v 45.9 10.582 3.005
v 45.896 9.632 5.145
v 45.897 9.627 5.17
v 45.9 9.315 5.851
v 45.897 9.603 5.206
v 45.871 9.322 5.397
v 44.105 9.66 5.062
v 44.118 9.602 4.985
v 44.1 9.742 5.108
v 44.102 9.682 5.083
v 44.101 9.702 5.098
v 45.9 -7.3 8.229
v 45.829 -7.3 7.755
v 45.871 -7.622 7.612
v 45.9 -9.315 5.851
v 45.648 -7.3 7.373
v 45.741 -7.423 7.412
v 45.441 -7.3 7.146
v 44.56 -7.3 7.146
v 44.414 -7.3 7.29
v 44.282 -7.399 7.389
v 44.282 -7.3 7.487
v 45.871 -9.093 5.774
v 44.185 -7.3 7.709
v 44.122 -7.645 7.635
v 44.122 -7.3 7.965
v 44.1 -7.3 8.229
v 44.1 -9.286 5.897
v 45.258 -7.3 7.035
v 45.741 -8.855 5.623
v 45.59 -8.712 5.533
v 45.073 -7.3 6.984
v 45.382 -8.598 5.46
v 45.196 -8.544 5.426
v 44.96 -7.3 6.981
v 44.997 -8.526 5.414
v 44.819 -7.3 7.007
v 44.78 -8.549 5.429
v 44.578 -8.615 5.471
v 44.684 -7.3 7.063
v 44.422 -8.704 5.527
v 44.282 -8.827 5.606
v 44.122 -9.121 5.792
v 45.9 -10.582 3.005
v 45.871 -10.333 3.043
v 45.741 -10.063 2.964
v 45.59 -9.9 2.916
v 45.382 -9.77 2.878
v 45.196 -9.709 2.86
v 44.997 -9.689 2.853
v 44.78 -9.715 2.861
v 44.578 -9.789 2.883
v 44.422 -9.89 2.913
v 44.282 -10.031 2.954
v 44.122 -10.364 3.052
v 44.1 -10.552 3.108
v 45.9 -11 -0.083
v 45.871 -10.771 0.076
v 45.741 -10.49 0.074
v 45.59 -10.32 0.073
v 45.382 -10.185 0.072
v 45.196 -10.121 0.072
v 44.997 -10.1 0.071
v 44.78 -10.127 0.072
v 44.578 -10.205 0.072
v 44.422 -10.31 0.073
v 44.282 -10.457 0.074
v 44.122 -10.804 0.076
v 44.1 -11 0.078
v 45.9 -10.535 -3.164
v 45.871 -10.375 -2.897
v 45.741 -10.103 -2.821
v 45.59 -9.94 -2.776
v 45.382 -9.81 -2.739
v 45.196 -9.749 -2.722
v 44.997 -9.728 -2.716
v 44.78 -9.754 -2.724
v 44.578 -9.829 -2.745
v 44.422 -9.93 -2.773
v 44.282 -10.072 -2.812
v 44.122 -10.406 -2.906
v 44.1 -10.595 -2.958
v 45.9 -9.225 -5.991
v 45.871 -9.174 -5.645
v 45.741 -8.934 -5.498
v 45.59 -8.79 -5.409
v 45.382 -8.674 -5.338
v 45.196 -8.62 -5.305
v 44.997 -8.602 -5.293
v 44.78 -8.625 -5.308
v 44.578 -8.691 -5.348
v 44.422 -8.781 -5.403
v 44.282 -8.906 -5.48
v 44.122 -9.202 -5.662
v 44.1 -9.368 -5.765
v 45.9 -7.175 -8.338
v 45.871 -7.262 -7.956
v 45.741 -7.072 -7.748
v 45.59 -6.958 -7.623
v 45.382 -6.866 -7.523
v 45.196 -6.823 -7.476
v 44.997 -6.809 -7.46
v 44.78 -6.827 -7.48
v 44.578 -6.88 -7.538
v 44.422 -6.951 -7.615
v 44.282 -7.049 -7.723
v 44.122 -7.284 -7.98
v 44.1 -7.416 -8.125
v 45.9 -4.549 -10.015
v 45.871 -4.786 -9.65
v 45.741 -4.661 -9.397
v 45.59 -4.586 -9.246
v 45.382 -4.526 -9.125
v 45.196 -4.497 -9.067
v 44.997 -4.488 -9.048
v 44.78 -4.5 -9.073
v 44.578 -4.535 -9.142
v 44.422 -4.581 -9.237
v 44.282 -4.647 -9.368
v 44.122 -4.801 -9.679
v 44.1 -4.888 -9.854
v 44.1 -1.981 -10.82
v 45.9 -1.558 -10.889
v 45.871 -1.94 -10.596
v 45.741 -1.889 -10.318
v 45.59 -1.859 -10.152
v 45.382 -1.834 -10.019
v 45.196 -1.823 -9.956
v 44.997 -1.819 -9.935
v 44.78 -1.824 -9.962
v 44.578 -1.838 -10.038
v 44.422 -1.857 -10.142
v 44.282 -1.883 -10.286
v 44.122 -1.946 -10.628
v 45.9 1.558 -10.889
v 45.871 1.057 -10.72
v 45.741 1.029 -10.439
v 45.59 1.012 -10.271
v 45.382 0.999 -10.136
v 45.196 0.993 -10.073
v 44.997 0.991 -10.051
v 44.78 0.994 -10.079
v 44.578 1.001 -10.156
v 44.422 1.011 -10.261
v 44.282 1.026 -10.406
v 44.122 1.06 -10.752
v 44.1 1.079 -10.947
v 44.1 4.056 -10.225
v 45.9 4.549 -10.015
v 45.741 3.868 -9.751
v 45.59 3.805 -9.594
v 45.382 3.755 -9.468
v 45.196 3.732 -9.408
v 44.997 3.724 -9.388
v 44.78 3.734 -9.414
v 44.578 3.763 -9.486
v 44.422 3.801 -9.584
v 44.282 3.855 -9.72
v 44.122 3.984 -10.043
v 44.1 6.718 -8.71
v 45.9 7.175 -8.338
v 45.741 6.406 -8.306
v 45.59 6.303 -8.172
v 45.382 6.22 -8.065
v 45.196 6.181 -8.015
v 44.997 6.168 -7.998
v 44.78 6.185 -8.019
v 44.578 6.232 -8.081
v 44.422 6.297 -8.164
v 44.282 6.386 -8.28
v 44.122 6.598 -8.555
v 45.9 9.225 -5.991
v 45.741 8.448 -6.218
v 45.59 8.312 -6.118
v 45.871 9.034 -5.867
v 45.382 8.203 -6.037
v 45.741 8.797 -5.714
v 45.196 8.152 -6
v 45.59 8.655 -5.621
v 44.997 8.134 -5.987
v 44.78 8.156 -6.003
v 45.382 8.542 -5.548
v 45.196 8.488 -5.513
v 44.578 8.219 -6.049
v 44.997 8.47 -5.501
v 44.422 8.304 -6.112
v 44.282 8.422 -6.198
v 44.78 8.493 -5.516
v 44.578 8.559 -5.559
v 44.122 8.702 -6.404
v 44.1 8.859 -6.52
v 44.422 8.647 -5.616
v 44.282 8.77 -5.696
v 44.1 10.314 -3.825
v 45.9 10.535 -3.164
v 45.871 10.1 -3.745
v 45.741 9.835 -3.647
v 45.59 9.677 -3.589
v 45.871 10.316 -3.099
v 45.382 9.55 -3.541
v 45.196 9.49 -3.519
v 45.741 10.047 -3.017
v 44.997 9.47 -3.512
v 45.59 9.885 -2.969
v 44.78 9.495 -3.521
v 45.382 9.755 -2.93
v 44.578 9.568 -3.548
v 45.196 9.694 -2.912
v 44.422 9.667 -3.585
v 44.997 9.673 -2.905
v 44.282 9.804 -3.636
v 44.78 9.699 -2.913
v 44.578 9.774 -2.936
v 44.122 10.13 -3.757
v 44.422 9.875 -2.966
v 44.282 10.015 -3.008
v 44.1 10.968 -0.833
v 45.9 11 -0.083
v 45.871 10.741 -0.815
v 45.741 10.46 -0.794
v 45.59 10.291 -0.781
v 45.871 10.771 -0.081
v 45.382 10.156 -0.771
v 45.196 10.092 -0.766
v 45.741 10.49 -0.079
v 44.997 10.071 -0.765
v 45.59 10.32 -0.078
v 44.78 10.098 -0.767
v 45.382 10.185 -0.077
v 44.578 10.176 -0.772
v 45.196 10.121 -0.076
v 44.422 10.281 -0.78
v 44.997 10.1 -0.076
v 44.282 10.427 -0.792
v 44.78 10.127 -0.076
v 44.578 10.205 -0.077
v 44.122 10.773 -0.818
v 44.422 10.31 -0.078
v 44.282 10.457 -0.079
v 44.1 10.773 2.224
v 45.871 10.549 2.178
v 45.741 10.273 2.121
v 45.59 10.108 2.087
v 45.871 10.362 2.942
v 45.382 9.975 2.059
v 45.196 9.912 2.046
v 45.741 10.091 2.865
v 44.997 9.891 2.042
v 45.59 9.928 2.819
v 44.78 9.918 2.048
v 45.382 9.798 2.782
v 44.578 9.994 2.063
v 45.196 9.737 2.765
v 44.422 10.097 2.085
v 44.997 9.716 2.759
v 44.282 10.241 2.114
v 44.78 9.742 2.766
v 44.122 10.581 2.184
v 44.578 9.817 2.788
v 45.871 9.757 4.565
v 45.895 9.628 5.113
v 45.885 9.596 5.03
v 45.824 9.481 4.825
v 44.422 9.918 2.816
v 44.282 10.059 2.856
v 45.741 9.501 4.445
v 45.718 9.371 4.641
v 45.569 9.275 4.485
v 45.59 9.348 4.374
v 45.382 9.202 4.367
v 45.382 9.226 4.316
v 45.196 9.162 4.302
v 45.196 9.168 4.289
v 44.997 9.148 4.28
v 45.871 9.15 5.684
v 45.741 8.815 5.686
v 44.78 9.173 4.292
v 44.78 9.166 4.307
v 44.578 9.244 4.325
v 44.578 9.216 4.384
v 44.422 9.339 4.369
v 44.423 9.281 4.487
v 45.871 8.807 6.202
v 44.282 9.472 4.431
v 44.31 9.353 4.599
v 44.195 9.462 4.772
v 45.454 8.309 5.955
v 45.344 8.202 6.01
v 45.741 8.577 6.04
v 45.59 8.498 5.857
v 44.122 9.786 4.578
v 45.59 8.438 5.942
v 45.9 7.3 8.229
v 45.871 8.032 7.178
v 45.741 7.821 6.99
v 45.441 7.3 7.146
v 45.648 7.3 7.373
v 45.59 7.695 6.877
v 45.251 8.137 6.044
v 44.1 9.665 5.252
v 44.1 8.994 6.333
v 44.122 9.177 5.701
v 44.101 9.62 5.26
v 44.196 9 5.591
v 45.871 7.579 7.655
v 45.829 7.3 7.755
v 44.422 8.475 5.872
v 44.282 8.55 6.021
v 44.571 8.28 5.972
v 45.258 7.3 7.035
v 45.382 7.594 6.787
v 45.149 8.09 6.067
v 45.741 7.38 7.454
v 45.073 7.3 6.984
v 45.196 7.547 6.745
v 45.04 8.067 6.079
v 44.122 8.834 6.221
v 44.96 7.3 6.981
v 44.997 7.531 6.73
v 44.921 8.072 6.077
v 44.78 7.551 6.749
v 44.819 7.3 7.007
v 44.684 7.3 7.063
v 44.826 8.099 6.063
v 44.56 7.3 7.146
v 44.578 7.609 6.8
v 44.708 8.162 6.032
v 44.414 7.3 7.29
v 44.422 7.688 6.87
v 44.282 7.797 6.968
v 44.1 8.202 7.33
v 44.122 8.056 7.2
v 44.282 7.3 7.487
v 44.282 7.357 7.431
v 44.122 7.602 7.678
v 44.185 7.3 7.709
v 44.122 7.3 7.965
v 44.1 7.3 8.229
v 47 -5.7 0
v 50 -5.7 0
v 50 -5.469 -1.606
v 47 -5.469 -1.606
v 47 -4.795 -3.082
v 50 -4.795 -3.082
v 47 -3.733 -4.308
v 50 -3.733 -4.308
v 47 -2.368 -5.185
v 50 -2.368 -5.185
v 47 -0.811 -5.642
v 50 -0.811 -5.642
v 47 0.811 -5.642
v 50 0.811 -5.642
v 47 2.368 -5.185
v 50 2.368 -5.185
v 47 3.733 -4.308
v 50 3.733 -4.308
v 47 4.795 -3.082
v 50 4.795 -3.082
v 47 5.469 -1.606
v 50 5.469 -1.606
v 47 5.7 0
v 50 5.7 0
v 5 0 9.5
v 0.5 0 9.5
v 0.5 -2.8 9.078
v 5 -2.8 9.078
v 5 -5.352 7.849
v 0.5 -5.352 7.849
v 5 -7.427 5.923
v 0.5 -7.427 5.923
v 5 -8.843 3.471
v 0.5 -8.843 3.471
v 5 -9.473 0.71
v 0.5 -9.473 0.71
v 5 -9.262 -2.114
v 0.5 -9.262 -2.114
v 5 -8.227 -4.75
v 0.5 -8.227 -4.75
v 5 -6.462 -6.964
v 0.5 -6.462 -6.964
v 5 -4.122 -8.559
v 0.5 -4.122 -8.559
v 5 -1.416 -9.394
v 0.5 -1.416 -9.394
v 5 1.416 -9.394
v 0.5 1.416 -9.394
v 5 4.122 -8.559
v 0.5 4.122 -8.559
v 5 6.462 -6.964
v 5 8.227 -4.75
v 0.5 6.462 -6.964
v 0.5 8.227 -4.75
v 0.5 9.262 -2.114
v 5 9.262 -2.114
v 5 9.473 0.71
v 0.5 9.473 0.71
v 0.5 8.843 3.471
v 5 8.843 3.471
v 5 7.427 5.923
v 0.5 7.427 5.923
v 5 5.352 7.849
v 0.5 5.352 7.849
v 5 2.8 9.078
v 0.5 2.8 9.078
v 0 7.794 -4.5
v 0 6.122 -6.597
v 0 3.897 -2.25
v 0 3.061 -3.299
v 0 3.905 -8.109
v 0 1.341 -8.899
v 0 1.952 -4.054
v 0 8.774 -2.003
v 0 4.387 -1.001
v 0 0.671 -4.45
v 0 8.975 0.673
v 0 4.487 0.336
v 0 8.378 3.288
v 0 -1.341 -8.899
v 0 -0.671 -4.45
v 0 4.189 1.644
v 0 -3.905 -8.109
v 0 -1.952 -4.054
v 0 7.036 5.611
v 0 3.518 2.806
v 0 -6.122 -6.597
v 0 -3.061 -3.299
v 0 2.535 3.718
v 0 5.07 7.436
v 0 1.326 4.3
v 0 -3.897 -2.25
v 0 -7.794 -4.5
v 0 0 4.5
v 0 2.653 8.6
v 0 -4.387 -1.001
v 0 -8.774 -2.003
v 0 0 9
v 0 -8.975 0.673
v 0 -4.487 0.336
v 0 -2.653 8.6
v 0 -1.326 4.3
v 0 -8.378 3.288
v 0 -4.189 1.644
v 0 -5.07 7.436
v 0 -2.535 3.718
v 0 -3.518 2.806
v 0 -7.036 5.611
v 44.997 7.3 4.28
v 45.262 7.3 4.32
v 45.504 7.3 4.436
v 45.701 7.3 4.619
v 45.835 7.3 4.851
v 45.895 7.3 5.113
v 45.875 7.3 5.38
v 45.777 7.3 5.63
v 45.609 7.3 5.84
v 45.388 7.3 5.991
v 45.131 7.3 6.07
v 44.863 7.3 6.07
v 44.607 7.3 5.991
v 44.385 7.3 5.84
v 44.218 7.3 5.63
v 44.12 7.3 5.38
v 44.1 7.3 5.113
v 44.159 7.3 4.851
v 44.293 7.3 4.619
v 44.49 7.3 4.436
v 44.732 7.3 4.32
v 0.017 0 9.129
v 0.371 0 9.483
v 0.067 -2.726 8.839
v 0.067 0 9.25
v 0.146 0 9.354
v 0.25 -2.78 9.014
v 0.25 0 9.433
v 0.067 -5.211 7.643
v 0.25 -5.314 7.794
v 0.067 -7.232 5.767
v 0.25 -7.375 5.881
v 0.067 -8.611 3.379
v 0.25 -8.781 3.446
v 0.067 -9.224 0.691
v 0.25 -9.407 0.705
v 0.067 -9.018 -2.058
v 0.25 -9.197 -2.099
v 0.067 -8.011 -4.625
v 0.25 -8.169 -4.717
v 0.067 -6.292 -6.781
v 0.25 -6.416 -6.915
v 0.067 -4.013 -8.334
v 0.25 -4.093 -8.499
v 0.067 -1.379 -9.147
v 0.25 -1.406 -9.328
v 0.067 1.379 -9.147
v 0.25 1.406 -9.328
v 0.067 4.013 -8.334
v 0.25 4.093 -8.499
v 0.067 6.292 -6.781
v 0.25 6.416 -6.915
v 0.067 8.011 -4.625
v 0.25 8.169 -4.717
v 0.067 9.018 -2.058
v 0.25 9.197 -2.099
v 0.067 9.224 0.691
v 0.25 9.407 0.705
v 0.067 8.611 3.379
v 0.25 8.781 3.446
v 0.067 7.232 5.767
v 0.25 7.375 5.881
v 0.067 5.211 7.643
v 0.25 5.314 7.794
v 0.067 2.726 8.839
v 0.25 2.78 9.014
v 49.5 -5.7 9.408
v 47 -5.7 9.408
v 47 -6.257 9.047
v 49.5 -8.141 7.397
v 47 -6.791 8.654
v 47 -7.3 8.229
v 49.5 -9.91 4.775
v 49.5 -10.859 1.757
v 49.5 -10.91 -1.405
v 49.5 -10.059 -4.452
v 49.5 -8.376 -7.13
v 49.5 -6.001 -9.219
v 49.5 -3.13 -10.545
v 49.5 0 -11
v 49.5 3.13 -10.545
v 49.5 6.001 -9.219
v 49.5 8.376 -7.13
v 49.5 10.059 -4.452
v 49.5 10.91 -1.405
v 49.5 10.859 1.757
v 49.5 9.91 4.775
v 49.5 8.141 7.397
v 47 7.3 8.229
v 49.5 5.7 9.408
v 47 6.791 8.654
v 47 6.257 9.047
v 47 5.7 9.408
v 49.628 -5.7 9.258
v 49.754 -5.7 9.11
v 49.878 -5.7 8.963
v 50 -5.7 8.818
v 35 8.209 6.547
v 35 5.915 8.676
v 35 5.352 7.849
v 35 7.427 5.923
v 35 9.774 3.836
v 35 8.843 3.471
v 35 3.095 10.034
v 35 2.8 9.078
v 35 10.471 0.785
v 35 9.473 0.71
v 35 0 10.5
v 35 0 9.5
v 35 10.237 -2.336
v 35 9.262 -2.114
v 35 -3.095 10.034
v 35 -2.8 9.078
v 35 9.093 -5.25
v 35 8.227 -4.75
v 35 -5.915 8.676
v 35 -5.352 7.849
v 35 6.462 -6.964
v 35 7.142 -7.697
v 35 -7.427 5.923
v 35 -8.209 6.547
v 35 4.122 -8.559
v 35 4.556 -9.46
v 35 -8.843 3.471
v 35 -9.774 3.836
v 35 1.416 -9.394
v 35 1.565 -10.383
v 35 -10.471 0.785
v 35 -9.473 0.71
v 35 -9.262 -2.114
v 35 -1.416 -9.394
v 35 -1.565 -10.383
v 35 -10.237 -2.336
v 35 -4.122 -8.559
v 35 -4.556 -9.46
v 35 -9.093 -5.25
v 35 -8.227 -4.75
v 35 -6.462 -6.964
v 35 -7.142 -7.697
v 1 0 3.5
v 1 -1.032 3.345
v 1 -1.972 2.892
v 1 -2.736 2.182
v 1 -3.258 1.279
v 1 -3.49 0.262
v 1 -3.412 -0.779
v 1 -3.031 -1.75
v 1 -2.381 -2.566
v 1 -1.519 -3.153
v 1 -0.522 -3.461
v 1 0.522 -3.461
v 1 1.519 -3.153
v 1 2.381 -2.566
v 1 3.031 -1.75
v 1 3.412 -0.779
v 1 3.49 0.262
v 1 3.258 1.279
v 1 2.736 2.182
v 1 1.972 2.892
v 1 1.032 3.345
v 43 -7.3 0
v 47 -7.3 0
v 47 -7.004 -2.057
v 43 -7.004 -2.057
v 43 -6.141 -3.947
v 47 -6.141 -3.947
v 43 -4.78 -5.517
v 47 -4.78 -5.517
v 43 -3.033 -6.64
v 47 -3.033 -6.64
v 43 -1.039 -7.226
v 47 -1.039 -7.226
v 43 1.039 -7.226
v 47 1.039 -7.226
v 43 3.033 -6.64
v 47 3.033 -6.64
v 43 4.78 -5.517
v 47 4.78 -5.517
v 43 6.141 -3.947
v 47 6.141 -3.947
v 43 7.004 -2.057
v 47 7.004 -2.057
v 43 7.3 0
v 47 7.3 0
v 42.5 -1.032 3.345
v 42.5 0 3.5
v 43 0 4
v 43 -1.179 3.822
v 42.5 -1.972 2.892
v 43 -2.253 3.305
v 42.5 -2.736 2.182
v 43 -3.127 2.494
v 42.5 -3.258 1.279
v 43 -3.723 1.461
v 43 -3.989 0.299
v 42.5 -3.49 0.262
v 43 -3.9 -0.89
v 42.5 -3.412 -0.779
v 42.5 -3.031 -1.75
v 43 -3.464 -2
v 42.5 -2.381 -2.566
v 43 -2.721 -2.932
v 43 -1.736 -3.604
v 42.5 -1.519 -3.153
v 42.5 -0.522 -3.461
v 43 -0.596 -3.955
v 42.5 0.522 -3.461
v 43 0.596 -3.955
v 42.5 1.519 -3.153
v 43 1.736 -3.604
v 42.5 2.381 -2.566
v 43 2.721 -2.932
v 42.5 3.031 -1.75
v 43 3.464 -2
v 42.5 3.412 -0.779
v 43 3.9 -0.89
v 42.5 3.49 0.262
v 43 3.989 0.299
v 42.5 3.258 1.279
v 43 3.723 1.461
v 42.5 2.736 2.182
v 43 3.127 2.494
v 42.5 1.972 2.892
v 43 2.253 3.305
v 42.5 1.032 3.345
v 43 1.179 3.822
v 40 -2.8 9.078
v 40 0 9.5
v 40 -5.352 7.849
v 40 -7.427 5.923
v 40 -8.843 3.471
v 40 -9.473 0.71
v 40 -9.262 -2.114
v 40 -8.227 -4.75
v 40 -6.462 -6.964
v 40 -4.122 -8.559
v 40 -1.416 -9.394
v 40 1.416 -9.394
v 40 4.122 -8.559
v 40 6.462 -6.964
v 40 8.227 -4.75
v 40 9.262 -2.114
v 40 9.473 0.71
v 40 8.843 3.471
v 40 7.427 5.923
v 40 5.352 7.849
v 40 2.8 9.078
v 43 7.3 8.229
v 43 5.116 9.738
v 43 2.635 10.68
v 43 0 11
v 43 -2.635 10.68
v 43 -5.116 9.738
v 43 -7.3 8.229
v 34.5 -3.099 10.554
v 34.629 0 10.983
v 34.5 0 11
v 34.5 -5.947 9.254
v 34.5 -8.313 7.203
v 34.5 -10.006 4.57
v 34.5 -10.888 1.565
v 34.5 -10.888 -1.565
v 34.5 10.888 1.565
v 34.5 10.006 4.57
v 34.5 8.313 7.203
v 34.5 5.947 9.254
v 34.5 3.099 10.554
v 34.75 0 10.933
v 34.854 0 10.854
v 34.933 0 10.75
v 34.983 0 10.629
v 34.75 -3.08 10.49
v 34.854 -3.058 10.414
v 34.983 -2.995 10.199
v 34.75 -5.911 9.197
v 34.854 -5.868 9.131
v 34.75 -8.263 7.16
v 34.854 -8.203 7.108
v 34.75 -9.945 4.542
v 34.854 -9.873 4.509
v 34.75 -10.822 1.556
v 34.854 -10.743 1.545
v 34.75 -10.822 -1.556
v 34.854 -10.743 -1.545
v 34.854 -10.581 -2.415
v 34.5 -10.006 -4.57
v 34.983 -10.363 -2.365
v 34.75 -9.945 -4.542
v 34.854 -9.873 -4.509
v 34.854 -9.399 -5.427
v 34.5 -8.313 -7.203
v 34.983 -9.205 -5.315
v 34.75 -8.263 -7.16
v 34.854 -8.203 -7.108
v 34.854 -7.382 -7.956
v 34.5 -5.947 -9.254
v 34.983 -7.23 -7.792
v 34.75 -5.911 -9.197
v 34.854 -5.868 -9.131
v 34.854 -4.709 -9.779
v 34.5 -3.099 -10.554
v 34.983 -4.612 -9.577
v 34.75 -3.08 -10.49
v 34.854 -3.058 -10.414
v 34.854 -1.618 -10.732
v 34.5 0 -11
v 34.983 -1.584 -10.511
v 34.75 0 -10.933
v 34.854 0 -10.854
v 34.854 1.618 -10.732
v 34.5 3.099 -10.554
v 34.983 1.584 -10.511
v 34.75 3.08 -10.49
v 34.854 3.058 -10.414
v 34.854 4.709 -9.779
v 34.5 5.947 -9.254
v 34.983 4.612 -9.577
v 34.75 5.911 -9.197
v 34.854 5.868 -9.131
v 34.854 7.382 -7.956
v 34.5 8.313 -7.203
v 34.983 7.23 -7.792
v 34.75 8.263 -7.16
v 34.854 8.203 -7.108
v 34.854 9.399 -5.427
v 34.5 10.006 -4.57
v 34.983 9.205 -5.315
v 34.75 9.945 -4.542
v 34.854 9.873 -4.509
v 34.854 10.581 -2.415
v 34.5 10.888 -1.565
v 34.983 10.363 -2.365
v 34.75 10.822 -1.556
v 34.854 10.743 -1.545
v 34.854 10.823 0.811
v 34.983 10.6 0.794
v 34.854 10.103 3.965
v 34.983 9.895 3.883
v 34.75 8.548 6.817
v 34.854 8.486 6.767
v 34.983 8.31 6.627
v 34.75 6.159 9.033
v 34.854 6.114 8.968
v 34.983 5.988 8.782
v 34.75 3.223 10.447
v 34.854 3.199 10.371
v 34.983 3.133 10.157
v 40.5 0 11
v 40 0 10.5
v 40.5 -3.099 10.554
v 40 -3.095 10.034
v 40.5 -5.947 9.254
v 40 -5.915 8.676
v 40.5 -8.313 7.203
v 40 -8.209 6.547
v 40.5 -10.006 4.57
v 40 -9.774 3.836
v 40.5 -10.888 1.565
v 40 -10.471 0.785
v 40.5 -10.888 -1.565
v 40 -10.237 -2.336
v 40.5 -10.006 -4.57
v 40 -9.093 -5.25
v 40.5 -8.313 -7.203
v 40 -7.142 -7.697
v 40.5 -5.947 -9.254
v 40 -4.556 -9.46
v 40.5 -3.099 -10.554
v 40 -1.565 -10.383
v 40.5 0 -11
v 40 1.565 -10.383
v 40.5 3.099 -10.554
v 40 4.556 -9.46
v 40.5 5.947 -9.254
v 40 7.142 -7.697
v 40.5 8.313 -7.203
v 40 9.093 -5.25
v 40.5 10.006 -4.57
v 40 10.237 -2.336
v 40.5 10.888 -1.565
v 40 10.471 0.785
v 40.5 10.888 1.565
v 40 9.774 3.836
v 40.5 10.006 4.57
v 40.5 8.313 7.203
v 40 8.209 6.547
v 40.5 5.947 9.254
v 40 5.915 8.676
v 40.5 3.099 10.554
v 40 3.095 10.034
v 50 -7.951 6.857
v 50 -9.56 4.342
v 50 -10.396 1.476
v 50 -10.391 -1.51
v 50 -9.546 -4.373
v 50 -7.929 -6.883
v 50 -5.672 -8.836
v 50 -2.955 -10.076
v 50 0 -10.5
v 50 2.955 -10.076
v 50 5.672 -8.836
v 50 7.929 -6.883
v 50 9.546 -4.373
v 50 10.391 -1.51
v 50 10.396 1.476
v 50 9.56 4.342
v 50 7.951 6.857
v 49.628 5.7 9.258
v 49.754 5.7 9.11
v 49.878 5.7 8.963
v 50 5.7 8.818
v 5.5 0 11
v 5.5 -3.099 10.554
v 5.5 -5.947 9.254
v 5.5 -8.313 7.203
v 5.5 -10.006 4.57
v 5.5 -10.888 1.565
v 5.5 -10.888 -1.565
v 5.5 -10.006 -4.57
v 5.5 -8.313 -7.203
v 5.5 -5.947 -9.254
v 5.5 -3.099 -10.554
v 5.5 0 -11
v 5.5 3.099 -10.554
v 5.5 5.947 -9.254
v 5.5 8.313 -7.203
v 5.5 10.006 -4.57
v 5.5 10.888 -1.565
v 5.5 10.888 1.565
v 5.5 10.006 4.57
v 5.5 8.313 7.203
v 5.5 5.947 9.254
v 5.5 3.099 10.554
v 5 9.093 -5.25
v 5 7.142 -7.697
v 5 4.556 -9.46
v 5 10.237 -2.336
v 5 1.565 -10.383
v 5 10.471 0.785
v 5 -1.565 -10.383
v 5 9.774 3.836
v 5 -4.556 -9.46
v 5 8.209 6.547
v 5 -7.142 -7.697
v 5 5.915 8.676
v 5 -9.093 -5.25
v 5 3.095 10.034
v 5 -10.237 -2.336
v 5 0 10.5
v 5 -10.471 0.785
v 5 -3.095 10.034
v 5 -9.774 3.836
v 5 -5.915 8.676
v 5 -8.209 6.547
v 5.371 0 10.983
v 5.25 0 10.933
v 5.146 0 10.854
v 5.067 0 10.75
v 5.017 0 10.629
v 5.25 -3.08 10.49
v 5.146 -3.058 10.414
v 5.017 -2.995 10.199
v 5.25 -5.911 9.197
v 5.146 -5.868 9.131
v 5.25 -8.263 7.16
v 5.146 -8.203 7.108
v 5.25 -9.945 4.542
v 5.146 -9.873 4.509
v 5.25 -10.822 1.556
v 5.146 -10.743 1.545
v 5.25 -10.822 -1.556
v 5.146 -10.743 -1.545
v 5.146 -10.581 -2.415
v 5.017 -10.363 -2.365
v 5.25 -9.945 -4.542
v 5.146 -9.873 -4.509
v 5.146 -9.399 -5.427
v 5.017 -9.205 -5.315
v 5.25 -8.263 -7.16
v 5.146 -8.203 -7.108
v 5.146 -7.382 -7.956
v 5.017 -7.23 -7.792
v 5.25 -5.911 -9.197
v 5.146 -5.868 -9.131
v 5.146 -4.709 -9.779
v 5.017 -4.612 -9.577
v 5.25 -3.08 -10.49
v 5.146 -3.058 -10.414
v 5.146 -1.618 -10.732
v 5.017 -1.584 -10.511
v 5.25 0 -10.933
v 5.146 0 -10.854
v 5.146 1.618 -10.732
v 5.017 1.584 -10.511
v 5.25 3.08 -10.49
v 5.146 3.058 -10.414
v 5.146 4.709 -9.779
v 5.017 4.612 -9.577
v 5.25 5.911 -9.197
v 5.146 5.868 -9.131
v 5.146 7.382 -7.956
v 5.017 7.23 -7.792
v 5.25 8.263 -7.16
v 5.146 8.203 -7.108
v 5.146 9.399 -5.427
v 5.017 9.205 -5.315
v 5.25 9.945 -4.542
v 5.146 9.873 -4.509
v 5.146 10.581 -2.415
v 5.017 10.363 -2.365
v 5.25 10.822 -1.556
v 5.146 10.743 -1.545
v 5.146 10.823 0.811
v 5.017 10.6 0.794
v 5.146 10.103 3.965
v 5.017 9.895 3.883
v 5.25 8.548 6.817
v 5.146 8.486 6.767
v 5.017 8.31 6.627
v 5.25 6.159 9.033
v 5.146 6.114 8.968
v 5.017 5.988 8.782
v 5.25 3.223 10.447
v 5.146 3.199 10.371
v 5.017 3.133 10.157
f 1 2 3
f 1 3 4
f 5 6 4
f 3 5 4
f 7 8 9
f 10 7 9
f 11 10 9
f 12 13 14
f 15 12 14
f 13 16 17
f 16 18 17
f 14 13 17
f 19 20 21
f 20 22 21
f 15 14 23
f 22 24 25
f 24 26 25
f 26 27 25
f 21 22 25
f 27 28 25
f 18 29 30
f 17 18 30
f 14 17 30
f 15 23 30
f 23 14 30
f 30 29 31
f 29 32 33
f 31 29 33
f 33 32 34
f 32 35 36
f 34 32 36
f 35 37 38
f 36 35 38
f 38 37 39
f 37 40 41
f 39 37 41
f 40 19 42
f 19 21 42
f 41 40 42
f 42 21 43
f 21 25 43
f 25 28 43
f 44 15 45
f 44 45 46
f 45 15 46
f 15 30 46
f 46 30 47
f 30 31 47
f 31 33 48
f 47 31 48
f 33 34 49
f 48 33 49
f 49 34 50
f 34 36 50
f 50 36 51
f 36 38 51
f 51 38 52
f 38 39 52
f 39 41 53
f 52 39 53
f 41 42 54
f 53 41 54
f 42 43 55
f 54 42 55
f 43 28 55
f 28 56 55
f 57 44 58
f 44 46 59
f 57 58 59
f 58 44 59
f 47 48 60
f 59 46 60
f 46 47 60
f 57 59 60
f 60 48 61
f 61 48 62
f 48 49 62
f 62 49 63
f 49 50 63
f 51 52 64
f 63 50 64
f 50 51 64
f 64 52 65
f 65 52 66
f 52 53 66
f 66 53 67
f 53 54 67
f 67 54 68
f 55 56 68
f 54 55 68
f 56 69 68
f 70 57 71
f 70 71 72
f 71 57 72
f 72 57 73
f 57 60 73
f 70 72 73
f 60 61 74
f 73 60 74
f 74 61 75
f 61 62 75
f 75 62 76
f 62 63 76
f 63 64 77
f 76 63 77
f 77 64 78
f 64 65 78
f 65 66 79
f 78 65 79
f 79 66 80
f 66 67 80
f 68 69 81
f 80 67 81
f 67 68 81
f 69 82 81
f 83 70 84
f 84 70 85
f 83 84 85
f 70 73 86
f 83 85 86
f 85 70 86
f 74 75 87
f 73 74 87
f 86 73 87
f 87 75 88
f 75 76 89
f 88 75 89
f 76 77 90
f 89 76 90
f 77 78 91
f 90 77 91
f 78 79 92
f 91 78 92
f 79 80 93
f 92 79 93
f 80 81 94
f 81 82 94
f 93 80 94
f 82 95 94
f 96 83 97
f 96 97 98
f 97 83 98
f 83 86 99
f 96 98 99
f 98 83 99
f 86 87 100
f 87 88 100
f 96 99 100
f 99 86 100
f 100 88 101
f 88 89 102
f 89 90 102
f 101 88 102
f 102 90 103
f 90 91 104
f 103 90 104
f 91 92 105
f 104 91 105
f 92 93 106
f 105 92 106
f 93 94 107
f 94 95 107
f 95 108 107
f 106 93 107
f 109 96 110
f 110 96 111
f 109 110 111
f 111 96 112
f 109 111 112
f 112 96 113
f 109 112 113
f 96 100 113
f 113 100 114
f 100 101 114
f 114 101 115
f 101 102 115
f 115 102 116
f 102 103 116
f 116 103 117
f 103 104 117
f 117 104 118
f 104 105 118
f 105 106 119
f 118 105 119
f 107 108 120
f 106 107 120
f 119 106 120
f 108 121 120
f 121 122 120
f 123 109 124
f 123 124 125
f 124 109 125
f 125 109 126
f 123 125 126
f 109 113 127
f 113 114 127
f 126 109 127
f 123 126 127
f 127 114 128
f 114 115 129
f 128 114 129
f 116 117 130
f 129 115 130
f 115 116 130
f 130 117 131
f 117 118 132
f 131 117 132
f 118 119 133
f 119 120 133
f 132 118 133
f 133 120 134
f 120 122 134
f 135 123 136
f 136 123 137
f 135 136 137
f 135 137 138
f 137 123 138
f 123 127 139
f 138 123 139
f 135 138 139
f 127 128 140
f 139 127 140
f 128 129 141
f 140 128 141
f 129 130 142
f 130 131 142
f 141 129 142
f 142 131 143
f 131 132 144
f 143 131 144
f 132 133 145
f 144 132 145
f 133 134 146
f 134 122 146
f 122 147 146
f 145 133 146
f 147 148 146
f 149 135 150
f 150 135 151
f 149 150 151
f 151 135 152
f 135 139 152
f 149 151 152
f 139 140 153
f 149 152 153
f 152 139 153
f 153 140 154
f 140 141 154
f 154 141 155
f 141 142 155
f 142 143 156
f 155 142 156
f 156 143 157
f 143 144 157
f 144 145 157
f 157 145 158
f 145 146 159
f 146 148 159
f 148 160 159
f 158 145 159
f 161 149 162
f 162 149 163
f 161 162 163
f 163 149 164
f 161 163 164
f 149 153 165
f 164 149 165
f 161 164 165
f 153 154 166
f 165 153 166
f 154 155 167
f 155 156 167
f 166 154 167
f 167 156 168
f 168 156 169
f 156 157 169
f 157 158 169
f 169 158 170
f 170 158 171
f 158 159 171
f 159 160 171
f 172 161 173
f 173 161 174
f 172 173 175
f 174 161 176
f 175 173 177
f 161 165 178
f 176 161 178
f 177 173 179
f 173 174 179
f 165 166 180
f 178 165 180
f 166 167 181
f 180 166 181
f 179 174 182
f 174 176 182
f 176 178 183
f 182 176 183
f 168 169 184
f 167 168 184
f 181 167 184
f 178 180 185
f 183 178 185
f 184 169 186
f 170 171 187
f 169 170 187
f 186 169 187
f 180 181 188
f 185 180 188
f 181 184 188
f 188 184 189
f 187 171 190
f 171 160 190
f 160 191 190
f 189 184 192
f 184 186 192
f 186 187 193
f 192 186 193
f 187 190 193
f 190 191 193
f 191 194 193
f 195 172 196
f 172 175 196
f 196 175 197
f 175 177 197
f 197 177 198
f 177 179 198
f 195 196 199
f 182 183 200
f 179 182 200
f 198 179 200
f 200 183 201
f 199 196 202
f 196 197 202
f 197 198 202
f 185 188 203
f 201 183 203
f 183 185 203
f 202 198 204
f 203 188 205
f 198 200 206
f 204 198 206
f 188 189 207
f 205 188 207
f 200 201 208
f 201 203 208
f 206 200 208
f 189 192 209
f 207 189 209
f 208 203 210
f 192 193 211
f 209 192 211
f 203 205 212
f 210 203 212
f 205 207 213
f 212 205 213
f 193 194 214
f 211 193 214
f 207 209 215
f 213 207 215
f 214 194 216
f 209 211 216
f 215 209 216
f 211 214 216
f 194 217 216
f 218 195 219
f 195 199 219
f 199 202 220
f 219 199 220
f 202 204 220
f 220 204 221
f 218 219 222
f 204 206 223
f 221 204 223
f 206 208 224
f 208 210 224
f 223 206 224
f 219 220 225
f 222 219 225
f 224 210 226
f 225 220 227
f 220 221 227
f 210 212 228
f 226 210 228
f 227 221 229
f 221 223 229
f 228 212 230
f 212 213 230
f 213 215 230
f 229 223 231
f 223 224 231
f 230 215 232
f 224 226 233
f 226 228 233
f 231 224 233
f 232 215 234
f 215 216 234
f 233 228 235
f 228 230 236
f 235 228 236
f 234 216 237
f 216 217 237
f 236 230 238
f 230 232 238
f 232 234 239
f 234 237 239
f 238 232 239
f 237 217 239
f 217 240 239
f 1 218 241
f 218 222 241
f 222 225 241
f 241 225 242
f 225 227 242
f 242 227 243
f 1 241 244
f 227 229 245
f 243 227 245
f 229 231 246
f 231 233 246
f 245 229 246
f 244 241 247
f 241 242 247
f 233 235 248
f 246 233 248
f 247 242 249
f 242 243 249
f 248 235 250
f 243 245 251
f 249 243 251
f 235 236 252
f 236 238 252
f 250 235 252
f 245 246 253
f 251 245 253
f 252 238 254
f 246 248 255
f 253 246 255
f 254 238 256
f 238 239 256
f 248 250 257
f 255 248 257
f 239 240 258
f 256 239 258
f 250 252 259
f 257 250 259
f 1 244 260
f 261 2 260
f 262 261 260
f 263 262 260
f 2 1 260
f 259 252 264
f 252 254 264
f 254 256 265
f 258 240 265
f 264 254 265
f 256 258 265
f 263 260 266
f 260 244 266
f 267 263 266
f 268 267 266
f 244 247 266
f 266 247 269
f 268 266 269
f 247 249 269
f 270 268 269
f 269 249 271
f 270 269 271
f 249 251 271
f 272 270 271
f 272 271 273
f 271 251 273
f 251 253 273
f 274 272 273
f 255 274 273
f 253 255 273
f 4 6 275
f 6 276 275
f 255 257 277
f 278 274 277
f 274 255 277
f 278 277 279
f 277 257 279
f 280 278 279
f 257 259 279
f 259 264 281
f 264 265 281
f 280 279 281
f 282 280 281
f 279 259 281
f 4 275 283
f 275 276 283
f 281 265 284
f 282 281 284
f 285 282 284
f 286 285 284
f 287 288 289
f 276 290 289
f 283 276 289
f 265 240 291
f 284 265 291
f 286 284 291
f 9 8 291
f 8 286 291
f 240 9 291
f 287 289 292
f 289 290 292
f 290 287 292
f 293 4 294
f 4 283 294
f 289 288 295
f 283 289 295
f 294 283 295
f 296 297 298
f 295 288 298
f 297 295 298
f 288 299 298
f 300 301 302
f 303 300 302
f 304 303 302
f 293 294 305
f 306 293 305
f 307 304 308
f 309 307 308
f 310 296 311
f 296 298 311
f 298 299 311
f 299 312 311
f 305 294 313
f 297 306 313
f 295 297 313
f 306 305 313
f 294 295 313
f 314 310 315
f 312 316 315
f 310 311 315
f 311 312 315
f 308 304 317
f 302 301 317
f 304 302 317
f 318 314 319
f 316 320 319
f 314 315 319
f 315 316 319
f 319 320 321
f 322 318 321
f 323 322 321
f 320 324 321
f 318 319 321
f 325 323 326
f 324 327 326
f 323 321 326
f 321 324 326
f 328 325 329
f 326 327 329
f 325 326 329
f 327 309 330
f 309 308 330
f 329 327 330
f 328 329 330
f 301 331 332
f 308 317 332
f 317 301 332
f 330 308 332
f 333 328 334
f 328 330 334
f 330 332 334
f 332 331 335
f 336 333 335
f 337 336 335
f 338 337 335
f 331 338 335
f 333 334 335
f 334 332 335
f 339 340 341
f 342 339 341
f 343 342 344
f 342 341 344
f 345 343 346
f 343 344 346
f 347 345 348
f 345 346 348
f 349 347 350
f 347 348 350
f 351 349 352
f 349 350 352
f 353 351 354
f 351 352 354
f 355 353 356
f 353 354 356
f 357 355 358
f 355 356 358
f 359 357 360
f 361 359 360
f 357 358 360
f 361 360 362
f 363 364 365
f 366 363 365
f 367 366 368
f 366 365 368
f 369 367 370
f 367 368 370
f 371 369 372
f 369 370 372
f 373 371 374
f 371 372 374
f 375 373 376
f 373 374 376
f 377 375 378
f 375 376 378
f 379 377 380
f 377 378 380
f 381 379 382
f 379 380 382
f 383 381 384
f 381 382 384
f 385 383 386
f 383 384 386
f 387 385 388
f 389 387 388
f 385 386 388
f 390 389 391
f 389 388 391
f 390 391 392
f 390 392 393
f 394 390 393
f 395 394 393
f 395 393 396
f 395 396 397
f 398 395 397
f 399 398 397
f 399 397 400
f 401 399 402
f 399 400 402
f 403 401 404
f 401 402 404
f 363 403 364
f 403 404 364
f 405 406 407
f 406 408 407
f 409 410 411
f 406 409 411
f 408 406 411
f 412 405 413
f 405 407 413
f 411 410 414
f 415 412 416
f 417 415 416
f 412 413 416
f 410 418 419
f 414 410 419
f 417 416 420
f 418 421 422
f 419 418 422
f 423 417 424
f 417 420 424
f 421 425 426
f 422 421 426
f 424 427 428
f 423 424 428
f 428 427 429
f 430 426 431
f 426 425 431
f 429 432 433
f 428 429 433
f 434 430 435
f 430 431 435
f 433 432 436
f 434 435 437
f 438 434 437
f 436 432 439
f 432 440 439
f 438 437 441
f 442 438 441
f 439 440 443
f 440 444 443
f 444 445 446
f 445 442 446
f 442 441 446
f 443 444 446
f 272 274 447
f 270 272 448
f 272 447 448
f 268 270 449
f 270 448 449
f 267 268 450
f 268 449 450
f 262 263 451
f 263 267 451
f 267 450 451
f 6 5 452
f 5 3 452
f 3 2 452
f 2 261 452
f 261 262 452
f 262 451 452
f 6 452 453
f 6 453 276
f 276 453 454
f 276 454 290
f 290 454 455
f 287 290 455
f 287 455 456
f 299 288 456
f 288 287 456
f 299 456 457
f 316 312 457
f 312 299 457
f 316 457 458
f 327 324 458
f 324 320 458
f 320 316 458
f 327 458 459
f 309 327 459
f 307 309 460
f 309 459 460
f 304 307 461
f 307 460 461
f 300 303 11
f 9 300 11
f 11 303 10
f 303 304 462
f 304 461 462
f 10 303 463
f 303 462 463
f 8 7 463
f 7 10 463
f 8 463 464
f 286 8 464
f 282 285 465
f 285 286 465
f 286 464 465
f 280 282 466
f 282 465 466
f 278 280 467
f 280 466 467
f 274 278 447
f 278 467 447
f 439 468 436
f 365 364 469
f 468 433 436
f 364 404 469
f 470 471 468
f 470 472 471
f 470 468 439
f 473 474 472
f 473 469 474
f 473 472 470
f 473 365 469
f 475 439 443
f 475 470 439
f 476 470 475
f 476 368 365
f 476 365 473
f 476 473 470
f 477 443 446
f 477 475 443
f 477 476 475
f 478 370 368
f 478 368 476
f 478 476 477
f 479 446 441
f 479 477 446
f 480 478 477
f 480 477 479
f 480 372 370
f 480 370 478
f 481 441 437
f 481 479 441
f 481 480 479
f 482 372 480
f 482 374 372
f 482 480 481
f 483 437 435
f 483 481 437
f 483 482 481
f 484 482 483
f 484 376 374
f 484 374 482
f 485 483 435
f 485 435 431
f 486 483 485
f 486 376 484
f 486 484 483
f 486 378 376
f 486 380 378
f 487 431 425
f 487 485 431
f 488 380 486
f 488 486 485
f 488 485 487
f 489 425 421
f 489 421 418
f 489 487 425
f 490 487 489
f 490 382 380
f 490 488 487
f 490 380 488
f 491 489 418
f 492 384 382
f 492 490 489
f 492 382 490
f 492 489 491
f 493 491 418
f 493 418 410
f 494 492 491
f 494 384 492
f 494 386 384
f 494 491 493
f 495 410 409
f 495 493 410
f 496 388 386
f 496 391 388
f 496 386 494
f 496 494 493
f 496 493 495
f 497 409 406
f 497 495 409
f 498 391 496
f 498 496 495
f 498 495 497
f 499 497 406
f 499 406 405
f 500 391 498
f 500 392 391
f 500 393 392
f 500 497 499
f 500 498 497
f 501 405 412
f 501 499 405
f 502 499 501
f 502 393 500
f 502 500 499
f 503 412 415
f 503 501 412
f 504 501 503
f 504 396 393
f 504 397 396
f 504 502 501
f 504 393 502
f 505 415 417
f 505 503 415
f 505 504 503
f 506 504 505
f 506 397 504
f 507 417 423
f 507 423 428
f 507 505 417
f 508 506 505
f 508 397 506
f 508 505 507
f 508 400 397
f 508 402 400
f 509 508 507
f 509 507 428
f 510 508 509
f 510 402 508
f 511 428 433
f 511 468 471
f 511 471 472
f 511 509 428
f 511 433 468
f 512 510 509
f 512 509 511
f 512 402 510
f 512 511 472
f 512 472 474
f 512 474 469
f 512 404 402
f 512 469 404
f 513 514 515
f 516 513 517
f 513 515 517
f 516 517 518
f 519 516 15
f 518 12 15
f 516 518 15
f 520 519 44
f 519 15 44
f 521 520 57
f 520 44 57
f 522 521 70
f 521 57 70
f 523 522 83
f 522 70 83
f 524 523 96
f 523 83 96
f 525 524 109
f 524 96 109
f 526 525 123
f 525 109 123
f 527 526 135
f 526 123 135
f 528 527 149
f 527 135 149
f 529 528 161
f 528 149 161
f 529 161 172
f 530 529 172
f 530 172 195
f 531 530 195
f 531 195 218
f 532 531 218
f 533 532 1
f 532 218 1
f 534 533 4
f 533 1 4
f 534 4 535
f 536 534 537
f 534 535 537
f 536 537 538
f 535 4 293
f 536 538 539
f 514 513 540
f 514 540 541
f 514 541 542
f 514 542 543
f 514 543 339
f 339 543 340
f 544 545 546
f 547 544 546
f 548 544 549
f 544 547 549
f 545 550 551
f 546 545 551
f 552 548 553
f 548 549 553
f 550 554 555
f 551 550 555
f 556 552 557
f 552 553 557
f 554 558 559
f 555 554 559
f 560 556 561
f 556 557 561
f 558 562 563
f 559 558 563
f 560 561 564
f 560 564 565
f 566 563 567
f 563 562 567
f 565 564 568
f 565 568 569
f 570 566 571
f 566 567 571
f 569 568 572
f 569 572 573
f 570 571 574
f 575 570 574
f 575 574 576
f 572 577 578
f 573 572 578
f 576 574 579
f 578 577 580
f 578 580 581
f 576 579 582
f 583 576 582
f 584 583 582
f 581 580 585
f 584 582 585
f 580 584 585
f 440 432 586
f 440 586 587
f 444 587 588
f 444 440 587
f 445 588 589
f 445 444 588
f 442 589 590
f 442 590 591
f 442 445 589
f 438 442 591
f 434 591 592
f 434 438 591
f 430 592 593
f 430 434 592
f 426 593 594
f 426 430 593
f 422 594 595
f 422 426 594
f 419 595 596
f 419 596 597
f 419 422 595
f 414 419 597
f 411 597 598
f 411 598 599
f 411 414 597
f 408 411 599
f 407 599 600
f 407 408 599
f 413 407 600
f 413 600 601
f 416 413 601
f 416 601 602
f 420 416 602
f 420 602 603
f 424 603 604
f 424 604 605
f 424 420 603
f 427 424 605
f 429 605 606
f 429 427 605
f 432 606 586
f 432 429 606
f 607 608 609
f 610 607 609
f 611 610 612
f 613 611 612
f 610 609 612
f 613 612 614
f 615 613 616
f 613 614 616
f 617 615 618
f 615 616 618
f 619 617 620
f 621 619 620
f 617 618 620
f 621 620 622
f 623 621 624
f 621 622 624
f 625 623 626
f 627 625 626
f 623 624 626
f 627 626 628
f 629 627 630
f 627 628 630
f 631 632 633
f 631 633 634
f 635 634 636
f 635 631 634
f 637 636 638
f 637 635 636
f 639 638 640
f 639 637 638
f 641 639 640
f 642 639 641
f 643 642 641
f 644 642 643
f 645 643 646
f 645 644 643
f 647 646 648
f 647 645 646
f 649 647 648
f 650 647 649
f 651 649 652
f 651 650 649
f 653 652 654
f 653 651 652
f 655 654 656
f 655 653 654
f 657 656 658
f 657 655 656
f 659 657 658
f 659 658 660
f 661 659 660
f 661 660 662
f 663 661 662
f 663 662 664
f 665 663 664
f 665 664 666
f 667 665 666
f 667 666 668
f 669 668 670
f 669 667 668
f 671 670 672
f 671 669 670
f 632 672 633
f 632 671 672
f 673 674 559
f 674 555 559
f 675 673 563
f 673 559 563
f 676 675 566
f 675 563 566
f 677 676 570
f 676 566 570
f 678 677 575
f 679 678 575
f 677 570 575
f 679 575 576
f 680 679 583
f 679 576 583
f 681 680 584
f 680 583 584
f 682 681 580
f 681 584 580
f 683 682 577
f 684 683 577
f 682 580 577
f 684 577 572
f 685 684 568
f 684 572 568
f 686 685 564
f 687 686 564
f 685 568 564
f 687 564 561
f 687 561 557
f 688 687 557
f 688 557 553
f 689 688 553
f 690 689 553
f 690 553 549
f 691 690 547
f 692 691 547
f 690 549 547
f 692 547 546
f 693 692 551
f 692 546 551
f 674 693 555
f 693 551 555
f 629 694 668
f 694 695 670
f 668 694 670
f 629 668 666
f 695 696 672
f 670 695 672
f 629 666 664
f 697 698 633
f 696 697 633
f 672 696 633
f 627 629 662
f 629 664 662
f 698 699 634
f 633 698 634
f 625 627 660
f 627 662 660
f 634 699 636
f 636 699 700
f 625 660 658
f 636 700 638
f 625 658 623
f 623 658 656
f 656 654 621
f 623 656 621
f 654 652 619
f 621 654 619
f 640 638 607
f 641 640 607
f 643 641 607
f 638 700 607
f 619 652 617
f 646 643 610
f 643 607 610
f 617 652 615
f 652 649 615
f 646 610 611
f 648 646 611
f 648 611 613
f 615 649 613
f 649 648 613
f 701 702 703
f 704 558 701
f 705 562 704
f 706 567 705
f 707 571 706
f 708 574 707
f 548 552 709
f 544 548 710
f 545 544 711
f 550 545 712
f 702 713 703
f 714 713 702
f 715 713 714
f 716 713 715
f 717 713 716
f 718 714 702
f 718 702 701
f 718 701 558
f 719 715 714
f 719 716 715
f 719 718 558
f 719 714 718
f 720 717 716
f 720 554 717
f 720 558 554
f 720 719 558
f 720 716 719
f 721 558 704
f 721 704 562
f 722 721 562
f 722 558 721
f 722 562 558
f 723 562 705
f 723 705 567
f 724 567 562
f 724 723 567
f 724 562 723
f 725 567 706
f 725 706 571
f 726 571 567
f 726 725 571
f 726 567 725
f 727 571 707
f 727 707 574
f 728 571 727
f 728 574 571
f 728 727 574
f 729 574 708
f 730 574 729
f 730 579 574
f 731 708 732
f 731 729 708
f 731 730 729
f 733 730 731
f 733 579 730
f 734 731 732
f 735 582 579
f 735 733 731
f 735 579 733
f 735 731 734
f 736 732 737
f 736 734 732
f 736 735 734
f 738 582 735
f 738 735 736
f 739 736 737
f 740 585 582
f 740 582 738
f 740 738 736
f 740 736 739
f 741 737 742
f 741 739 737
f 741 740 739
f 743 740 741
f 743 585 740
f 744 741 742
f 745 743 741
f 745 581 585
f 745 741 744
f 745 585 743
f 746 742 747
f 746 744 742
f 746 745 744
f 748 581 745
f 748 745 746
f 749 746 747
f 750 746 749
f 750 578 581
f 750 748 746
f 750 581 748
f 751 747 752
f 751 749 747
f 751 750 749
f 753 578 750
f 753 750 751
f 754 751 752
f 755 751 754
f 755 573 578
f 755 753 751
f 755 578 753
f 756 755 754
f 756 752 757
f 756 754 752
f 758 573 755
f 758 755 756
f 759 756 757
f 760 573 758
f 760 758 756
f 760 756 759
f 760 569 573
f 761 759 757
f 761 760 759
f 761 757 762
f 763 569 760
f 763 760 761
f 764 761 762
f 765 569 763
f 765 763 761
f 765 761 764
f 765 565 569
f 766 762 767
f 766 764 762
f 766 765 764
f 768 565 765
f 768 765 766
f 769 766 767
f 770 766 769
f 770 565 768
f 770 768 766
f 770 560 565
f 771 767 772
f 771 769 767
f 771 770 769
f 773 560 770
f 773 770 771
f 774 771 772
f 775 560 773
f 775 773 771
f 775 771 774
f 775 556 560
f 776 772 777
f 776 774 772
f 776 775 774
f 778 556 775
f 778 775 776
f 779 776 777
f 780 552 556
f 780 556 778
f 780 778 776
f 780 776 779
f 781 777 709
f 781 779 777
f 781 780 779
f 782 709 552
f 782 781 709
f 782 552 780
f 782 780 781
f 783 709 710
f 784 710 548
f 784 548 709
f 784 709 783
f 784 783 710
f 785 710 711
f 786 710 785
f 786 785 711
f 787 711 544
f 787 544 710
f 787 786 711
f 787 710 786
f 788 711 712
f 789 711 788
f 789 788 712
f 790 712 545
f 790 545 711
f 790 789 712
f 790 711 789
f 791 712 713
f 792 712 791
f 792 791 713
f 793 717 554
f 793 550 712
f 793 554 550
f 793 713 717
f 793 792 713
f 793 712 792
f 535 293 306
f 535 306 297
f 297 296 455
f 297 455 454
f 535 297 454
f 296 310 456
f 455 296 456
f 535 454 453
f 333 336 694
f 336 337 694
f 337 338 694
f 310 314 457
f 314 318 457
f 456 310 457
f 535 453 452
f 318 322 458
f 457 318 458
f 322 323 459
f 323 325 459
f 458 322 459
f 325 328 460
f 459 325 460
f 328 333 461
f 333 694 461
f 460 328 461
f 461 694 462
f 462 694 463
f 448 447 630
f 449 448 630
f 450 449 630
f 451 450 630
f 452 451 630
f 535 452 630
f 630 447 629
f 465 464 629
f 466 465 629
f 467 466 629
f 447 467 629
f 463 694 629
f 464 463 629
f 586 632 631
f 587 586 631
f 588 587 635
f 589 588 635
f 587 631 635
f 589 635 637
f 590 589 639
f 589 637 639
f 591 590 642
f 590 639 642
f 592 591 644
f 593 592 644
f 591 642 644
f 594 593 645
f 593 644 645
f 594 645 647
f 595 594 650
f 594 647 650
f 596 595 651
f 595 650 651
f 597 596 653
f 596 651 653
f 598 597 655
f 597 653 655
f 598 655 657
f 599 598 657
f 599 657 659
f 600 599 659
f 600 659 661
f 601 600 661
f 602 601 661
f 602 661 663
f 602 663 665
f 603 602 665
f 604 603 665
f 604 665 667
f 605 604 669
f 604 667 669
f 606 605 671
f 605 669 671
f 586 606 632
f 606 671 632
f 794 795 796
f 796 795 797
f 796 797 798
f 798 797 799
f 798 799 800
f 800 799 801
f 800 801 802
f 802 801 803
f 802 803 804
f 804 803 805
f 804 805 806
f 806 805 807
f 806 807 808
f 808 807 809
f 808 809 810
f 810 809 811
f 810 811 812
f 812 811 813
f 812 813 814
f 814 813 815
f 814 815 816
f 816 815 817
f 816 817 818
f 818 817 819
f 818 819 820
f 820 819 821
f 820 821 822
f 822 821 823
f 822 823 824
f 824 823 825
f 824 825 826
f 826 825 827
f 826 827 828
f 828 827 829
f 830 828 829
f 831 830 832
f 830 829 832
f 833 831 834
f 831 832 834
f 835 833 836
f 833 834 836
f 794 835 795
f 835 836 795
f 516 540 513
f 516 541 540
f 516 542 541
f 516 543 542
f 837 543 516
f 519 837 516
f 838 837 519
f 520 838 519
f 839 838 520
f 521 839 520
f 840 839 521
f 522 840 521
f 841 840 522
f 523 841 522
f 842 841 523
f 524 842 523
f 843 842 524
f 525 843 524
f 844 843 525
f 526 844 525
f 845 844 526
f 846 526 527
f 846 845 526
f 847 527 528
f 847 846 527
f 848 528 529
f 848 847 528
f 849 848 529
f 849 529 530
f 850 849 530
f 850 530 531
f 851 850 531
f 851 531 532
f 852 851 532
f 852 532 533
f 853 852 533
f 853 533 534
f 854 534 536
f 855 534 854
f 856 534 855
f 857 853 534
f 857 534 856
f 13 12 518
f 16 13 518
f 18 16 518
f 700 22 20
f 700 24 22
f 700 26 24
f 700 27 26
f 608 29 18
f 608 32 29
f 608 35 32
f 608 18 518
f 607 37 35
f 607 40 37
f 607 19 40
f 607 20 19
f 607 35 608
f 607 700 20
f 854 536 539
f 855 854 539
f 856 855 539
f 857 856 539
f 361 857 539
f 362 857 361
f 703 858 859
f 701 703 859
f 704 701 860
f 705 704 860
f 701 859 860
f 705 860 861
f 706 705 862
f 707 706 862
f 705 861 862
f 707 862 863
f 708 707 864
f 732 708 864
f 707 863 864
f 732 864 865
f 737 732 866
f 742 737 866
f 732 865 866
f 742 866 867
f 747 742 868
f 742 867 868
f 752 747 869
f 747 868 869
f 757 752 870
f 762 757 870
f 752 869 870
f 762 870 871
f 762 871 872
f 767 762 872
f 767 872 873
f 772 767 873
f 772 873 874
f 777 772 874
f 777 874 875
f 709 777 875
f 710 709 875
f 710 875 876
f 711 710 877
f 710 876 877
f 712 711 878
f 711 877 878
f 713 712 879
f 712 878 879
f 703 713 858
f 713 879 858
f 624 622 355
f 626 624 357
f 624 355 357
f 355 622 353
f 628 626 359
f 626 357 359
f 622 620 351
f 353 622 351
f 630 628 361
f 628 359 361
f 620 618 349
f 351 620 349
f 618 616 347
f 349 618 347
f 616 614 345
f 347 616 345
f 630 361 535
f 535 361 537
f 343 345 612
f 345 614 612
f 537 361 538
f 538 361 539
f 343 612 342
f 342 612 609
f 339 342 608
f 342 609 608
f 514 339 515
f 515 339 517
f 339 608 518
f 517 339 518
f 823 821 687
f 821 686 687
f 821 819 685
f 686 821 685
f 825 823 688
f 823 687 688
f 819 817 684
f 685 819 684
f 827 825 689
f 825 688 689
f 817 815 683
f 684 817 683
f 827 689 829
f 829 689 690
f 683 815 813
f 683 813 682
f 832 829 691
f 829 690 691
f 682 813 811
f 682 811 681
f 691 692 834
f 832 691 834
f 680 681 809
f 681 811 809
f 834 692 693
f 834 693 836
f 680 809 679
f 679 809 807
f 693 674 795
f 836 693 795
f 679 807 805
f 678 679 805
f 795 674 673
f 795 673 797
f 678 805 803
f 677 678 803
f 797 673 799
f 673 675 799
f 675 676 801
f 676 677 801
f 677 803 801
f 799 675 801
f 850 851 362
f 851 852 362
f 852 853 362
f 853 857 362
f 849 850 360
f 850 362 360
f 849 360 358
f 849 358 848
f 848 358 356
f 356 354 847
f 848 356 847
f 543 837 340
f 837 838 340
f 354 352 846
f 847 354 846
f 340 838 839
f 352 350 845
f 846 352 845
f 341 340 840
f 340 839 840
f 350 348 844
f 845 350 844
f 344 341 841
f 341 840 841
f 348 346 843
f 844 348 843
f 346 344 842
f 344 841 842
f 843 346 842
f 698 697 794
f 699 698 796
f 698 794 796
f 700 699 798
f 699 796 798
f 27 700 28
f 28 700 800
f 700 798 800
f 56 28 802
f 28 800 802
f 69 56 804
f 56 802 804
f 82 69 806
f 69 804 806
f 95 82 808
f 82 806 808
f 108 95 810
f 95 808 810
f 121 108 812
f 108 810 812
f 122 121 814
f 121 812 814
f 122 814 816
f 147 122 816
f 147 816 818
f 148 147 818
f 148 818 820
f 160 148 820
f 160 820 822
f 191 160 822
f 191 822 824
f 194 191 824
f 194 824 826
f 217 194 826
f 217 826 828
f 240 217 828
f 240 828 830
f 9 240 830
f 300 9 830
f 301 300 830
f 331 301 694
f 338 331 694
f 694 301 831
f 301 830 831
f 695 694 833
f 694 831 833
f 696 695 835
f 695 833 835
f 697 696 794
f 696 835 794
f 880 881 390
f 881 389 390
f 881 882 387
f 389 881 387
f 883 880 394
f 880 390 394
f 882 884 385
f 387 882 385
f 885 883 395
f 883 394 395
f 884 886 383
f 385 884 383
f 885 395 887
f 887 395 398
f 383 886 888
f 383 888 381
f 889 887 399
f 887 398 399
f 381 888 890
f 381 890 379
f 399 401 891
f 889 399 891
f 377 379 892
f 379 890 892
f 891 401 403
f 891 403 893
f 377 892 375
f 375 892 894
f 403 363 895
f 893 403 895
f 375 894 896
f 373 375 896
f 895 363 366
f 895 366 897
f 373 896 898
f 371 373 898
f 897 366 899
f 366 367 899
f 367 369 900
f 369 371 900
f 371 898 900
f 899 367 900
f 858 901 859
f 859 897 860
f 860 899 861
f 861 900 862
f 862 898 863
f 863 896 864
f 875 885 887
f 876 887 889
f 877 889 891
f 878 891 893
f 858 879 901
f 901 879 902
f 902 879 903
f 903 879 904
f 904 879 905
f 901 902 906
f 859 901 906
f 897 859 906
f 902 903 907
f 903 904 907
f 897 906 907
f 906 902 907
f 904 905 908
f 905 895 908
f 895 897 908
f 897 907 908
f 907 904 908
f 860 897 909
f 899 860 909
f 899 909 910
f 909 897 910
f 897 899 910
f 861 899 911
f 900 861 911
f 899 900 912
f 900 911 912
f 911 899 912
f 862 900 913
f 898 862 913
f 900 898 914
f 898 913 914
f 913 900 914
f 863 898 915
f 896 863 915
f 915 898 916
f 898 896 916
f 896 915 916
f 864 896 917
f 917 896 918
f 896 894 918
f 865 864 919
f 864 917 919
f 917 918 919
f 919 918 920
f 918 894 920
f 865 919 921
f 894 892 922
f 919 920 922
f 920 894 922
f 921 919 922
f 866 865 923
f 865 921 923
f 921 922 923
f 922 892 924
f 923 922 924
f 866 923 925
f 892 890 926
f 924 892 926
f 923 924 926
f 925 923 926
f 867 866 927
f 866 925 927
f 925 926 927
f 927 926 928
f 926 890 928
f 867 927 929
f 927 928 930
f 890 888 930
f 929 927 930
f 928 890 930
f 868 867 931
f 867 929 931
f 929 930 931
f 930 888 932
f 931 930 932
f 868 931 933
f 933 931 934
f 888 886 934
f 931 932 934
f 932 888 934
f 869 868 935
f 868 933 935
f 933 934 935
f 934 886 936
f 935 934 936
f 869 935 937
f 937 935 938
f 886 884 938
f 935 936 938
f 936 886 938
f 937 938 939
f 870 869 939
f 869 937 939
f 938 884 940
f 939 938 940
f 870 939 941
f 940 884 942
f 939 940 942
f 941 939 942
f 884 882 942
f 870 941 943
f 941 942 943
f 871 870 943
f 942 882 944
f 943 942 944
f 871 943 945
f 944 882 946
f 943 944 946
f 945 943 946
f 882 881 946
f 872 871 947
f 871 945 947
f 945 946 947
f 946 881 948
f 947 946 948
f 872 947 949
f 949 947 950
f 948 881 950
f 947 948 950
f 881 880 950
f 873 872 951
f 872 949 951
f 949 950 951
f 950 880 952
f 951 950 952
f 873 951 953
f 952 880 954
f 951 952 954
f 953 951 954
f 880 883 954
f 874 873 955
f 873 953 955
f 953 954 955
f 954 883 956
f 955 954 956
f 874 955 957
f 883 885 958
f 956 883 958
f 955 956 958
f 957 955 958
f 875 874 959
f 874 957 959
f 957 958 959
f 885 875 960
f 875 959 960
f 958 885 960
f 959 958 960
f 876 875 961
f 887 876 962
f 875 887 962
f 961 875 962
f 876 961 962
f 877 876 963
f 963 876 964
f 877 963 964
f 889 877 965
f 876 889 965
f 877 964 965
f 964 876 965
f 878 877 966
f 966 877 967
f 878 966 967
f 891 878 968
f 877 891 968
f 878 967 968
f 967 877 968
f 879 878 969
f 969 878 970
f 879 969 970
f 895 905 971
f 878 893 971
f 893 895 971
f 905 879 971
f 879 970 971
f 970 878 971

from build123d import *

# Parameters (mm, degrees)
ESBO_O2_W             = 11.092241592
ESBO_O2_H             = 11.4
CORTE_EXTRUS_O1_DEPTH = 3
ESBO_O6_W             = 12.102266842
ESBO_O6_H             = 14.6
CORTE_EXTRUS_O2_DEPTH = 4
CHANFRO1_SIZE         = 1
FILETE1_R             = 0.5
CHANFRO2_SIZE         = 0.5
CHANFRO3_SIZE         = 0.5
CORTE_EXTRUS_O3_REACH = 56.368
ESBO_O7_R             = 0.9
FILETE2_R             = 0.5
FILETE3_R             = 0.5


with BuildPart() as part:
    # Esboço1 → Revolução1 (revolve)
    with BuildSketch(Plane(origin=(0, 0, 0), x_dir=(1, 0, 0), z_dir=(0, 1, 0)), mode=Mode.PRIVATE) as revolu_o1_sk:
        with BuildLine():
            Line((0, 3.5), (43, 3.5))
            Line((43, 3.5), (43, 7.3))
            Line((43, 7.3), (47, 7.3))
            Line((47, 7.3), (47, 5.7))
            Line((47, 5.7), (50, 5.7))
            Line((50, 5.7), (50, 11))
            Line((50, 11), (45.9, 11))
            ThreePointArc((45.9, 11), (45, 10.1), (44.1, 11))
            Line((44.1, 11), (40, 11))
            Line((40, 11), (40, 9.5))
            Line((40, 9.5), (35, 9.5))
            Line((35, 9.5), (35, 11))
            Line((35, 11), (5, 11))
            Line((5, 11), (5, 9.5))
            Line((5, 9.5), (0, 9.5))
            Line((0, 9.5), (0, 3.5))
        make_face()
    revolve(revolu_o1_sk.sketch.rotate(Axis((0, 0, 0), (1, 0, 0)), 180), axis=Axis((0, 0, 0), (1, 0, 0)))

    # Esboço2 → Corte-extrusão1 (cut)
    with BuildSketch(Plane(origin=(50, 0, 0), x_dir=(0, 0, -1), z_dir=(1, 0, 0))):
        with Locations((-5.546120796, 0)):
            Rectangle(ESBO_O2_W, ESBO_O2_H)
    extrude(amount=-CORTE_EXTRUS_O1_DEPTH, mode=Mode.SUBTRACT)

    # Esboço6 → Corte-extrusão2 (cut)
    with BuildSketch(Plane(origin=(43, 0, 0), x_dir=(0, 0, -1), z_dir=(1, 0, 0))):
        with Locations((-6.051133421, 0)):
            Rectangle(ESBO_O6_W, ESBO_O6_H)
    extrude(amount=CORTE_EXTRUS_O2_DEPTH, mode=Mode.SUBTRACT)

    # Chanfro1
    chanfro1_edges = [part.edges().sort_by_distance(p)[0] for p in [
        (0, 0, -3.5),
    ]]
    chamfer(chanfro1_edges, length=CHANFRO1_SIZE)

    # Filete1
    filete1_edges = [part.edges().sort_by_distance(p)[0] for p in [
        (0, 0, -9.5),
    ]]
    fillet(filete1_edges, radius=FILETE1_R)

    # Chanfro2
    chanfro2_edges = [part.edges().sort_by_distance(p)[0] for p in [
        (40, 0, -11),
        (50, 0, -11),
    ]]
    chamfer(chanfro2_edges, length=CHANFRO2_SIZE)

    # Chanfro3
    chanfro3_edges = [part.edges().sort_by_distance(p)[0] for p in [
        (43, 0, -3.5),
    ]]
    chamfer(chanfro3_edges, length=CHANFRO3_SIZE)

    # Esboço7 → Corte-extrusão3 (cut, up to next)
    with BuildSketch(Plane.XZ.offset(-7.3), mode=Mode.PRIVATE) as corte_extrus_o3_sk1:
        with Locations(Location((44.997134116, 5.179978196, 0), (0, 0, 270))):
            Circle(ESBO_O7_R)
    corte_extrus_o3_tool1 = extrude(corte_extrus_o3_sk1.sketch, amount=-CORTE_EXTRUS_O3_REACH, mode=Mode.PRIVATE) & part.part
    add(corte_extrus_o3_tool1.solids().sort_by_distance((44.997134, 7.3, 5.179978))[0], mode=Mode.SUBTRACT)

    # Filete2
    filete2_edges = [part.edges().sort_by_distance(p)[0] for p in [
        (5, 0, -11),
    ]]
    fillet(filete2_edges, radius=FILETE2_R)

    # Filete3
    filete3_edges = [part.edges().sort_by_distance(p)[0] for p in [
        (35, 0, -11),
    ]]
    fillet(filete3_edges, radius=FILETE3_R)


solid = part.part
